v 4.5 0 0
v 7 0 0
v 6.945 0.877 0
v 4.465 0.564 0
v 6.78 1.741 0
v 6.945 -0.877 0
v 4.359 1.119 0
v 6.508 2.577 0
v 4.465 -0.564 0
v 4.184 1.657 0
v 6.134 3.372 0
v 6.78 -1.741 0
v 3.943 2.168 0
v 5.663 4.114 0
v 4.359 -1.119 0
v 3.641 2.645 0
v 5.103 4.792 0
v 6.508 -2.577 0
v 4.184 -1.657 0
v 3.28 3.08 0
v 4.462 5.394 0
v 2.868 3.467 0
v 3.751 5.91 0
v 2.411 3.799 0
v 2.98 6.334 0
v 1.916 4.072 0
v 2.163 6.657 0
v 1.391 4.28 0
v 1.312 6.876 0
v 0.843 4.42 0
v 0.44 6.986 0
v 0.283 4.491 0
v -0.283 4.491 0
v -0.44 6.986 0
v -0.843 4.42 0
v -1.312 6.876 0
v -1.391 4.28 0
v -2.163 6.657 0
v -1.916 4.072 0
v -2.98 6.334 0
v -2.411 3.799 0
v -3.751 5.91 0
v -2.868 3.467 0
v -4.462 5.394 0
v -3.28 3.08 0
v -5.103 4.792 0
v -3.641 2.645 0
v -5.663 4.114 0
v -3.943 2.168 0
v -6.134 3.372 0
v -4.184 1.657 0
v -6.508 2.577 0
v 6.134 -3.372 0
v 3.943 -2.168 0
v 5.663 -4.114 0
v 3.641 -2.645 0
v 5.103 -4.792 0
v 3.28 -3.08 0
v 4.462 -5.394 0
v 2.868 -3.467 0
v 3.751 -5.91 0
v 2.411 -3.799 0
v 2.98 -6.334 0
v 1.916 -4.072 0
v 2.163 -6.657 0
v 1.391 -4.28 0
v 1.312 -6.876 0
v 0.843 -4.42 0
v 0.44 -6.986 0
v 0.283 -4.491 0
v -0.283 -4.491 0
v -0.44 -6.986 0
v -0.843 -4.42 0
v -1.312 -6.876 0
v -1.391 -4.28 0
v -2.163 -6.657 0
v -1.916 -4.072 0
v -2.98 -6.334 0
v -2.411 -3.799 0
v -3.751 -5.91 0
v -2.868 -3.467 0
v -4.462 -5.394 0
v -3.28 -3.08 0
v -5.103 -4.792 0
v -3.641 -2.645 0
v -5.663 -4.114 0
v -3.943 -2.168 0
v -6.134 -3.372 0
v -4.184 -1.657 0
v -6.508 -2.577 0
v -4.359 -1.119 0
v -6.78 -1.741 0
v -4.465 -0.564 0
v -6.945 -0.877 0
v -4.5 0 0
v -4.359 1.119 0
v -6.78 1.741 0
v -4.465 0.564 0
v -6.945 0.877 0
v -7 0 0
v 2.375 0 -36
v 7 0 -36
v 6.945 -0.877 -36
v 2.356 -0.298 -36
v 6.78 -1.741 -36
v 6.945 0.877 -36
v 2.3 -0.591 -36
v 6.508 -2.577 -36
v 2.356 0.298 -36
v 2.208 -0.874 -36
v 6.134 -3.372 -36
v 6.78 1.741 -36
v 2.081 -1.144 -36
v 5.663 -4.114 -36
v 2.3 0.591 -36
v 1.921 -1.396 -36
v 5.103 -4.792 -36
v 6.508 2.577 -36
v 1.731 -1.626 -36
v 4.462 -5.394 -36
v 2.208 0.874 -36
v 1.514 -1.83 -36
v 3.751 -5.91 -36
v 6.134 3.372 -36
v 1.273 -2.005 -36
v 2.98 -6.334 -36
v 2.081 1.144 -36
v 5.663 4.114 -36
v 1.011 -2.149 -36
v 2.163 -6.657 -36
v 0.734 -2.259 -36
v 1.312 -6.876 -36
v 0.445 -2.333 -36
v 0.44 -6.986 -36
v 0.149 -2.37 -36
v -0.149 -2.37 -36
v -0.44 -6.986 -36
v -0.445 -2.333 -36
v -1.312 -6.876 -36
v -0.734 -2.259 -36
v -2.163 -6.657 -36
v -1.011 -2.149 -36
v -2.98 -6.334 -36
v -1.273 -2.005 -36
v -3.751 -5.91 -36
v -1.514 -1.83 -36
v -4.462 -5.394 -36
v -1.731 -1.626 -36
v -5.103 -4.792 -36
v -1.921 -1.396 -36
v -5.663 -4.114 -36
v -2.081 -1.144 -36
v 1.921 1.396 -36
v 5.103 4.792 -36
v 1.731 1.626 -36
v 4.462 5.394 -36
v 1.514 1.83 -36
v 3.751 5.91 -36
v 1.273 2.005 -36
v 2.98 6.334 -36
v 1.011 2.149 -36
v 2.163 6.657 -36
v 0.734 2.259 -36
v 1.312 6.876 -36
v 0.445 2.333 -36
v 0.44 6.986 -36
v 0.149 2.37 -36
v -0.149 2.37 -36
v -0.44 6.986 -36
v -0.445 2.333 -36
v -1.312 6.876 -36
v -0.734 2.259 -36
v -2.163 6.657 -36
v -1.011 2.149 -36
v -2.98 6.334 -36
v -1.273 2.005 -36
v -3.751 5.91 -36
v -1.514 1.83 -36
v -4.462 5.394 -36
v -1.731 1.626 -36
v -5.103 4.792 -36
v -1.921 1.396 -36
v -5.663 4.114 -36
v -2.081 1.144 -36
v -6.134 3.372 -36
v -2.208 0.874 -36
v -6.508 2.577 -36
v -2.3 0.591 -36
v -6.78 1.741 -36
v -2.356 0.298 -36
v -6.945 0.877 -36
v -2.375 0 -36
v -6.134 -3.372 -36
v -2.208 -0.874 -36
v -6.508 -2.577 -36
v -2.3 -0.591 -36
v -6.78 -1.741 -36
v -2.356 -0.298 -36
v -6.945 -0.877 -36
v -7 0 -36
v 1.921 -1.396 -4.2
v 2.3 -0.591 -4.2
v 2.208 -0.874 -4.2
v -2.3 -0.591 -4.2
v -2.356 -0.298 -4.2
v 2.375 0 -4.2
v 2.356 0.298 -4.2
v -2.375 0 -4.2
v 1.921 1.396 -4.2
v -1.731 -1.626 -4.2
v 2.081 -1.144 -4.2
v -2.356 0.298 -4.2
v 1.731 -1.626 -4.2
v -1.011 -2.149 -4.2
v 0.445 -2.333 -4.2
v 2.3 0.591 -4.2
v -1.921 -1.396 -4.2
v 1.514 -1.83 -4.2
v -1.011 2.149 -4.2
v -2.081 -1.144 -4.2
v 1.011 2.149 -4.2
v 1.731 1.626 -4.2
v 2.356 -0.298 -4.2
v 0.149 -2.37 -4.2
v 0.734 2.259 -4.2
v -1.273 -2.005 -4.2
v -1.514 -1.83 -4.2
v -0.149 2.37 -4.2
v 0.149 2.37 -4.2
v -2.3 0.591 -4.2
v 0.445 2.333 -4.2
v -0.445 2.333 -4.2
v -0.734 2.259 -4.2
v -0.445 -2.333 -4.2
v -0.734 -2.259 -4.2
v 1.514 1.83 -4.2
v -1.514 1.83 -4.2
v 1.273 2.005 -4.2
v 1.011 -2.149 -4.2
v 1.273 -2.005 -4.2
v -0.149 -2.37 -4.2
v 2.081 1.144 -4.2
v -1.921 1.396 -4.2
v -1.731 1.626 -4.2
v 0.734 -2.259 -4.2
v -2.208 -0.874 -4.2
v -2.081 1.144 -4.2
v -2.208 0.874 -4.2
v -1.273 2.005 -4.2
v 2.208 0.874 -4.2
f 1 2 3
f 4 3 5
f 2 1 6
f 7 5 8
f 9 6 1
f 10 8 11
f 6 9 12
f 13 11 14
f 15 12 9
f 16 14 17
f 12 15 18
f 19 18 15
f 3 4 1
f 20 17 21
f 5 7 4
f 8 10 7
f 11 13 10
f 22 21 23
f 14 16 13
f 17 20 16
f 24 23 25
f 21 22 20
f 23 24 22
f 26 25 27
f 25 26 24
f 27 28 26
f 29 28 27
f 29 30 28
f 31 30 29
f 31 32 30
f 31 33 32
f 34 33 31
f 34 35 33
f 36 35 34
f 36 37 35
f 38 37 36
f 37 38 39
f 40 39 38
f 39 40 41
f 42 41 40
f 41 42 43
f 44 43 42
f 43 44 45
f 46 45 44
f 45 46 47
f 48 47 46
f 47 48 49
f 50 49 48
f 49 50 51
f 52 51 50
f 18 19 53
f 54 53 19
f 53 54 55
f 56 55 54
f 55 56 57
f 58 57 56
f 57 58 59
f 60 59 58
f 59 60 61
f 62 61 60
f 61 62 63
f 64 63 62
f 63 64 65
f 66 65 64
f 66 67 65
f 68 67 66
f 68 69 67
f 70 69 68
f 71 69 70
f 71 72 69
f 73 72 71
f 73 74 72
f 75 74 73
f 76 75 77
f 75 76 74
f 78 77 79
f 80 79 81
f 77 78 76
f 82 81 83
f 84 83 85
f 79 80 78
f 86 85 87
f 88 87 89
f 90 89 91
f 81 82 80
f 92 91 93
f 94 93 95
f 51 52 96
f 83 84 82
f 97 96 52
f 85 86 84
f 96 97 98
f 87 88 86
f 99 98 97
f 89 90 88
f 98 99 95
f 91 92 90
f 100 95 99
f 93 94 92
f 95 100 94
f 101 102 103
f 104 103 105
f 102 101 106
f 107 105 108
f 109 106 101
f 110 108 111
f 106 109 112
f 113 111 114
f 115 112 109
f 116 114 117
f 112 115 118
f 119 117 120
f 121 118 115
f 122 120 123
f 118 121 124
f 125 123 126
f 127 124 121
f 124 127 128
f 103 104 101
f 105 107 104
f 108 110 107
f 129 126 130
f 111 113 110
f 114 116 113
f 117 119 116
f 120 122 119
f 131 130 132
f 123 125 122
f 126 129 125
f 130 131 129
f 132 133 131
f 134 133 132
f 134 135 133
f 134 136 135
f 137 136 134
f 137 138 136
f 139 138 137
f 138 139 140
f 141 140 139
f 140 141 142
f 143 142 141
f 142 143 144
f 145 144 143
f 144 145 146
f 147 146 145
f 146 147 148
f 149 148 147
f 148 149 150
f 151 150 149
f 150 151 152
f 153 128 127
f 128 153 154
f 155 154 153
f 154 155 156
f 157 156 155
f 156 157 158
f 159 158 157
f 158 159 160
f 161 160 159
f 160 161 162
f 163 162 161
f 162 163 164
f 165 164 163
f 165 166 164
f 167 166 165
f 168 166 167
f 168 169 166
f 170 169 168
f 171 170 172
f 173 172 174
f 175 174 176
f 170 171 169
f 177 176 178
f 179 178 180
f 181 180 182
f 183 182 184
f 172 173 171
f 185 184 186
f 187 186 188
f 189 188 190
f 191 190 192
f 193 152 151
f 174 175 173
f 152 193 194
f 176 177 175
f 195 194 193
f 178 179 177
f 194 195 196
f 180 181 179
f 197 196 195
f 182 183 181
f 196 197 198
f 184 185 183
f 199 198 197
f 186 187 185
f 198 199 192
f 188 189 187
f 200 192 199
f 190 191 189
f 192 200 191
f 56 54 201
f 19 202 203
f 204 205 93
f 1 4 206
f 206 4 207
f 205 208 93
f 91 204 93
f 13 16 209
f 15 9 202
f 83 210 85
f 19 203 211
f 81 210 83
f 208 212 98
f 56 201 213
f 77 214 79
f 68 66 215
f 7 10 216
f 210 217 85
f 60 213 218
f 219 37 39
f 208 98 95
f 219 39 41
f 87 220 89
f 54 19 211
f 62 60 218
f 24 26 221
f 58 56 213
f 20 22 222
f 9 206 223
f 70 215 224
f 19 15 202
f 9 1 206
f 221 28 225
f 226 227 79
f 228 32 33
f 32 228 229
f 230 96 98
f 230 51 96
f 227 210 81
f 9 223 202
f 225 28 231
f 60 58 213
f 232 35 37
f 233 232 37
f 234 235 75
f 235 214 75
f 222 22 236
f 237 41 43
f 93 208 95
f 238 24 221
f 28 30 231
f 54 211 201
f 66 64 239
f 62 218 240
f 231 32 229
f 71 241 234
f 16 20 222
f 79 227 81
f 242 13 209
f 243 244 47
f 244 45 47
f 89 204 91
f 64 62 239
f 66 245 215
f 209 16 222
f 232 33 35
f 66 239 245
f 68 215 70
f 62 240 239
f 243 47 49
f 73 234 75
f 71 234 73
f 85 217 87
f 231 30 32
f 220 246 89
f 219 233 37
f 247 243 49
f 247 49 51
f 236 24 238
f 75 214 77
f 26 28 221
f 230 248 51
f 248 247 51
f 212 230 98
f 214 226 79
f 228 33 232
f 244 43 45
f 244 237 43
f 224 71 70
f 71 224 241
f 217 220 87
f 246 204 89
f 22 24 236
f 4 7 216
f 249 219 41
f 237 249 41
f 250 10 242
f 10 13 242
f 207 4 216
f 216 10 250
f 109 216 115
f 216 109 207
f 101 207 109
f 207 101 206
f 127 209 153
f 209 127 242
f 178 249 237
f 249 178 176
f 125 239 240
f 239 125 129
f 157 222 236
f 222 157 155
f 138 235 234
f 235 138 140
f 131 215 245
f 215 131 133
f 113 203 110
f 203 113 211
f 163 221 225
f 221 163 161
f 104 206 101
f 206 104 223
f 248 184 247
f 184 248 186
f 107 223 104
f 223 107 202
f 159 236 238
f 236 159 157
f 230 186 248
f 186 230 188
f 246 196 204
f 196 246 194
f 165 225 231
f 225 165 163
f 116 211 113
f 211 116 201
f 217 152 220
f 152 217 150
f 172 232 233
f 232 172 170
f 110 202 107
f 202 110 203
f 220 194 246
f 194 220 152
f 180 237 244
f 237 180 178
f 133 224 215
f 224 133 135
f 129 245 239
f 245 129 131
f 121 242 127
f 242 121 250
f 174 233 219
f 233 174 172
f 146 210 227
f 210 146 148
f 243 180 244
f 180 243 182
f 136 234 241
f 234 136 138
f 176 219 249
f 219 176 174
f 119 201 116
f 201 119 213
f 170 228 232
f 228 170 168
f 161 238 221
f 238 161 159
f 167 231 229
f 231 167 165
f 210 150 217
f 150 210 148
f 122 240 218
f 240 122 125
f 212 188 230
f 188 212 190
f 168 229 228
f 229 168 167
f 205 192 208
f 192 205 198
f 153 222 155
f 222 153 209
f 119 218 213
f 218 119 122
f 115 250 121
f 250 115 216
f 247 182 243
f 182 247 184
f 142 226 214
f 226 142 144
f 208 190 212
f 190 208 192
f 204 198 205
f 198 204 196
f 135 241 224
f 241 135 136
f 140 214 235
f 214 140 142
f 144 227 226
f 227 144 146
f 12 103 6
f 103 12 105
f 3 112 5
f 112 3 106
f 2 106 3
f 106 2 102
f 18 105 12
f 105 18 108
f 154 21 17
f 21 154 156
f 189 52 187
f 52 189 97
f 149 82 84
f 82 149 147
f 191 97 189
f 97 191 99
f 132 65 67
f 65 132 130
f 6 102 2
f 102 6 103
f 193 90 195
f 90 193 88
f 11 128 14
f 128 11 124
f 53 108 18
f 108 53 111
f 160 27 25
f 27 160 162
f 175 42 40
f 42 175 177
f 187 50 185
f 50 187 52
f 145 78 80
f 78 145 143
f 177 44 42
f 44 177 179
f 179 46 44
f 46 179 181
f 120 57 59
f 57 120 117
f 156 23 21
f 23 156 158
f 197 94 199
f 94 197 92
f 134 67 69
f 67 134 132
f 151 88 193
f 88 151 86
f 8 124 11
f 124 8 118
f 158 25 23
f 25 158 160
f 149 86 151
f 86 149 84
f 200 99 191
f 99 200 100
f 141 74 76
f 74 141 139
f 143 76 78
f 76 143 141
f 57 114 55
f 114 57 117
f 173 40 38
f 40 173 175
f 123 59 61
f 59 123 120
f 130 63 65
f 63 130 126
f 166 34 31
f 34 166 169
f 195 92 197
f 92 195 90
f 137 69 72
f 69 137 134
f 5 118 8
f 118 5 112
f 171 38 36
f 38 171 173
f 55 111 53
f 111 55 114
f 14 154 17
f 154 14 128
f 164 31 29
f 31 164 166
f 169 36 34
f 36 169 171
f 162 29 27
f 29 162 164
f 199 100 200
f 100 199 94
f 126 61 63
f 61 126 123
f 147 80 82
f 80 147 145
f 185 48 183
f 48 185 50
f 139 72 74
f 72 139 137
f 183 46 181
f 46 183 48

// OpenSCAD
$fn = 50;


difference() {
	union() {
		translate(v = [0, 0, -36.0000000000]) {
			cylinder(h = 36, r = 7.0000000000);
		}
		cylinder(h = 0, r = 16.0000000000);
	}
	union() {
		translate(v = [0, 0, 0]) {
			rotate(a = [0, 0, 0]) {
				difference() {
					union() {
						#translate(v = [0, 0, -36.0000000000]) {
							cylinder(h = 36, r = 2.2500000000);
						}
						#translate(v = [0, 0, -4.2000000000]) {
							cylinder(h = 4.2000000000, r1 = 2.3750000000, r2 = 4.5000000000);
						}
						#translate(v = [0, 0, -36.0000000000]) {
							cylinder(h = 36, r = 2.3750000000);
						}
						#translate(v = [0, 0, -36.0000000000]) {
							cylinder(h = 36, r = 2.2500000000);
						}
					}
					union();
				}
			}
		}
	}
}
